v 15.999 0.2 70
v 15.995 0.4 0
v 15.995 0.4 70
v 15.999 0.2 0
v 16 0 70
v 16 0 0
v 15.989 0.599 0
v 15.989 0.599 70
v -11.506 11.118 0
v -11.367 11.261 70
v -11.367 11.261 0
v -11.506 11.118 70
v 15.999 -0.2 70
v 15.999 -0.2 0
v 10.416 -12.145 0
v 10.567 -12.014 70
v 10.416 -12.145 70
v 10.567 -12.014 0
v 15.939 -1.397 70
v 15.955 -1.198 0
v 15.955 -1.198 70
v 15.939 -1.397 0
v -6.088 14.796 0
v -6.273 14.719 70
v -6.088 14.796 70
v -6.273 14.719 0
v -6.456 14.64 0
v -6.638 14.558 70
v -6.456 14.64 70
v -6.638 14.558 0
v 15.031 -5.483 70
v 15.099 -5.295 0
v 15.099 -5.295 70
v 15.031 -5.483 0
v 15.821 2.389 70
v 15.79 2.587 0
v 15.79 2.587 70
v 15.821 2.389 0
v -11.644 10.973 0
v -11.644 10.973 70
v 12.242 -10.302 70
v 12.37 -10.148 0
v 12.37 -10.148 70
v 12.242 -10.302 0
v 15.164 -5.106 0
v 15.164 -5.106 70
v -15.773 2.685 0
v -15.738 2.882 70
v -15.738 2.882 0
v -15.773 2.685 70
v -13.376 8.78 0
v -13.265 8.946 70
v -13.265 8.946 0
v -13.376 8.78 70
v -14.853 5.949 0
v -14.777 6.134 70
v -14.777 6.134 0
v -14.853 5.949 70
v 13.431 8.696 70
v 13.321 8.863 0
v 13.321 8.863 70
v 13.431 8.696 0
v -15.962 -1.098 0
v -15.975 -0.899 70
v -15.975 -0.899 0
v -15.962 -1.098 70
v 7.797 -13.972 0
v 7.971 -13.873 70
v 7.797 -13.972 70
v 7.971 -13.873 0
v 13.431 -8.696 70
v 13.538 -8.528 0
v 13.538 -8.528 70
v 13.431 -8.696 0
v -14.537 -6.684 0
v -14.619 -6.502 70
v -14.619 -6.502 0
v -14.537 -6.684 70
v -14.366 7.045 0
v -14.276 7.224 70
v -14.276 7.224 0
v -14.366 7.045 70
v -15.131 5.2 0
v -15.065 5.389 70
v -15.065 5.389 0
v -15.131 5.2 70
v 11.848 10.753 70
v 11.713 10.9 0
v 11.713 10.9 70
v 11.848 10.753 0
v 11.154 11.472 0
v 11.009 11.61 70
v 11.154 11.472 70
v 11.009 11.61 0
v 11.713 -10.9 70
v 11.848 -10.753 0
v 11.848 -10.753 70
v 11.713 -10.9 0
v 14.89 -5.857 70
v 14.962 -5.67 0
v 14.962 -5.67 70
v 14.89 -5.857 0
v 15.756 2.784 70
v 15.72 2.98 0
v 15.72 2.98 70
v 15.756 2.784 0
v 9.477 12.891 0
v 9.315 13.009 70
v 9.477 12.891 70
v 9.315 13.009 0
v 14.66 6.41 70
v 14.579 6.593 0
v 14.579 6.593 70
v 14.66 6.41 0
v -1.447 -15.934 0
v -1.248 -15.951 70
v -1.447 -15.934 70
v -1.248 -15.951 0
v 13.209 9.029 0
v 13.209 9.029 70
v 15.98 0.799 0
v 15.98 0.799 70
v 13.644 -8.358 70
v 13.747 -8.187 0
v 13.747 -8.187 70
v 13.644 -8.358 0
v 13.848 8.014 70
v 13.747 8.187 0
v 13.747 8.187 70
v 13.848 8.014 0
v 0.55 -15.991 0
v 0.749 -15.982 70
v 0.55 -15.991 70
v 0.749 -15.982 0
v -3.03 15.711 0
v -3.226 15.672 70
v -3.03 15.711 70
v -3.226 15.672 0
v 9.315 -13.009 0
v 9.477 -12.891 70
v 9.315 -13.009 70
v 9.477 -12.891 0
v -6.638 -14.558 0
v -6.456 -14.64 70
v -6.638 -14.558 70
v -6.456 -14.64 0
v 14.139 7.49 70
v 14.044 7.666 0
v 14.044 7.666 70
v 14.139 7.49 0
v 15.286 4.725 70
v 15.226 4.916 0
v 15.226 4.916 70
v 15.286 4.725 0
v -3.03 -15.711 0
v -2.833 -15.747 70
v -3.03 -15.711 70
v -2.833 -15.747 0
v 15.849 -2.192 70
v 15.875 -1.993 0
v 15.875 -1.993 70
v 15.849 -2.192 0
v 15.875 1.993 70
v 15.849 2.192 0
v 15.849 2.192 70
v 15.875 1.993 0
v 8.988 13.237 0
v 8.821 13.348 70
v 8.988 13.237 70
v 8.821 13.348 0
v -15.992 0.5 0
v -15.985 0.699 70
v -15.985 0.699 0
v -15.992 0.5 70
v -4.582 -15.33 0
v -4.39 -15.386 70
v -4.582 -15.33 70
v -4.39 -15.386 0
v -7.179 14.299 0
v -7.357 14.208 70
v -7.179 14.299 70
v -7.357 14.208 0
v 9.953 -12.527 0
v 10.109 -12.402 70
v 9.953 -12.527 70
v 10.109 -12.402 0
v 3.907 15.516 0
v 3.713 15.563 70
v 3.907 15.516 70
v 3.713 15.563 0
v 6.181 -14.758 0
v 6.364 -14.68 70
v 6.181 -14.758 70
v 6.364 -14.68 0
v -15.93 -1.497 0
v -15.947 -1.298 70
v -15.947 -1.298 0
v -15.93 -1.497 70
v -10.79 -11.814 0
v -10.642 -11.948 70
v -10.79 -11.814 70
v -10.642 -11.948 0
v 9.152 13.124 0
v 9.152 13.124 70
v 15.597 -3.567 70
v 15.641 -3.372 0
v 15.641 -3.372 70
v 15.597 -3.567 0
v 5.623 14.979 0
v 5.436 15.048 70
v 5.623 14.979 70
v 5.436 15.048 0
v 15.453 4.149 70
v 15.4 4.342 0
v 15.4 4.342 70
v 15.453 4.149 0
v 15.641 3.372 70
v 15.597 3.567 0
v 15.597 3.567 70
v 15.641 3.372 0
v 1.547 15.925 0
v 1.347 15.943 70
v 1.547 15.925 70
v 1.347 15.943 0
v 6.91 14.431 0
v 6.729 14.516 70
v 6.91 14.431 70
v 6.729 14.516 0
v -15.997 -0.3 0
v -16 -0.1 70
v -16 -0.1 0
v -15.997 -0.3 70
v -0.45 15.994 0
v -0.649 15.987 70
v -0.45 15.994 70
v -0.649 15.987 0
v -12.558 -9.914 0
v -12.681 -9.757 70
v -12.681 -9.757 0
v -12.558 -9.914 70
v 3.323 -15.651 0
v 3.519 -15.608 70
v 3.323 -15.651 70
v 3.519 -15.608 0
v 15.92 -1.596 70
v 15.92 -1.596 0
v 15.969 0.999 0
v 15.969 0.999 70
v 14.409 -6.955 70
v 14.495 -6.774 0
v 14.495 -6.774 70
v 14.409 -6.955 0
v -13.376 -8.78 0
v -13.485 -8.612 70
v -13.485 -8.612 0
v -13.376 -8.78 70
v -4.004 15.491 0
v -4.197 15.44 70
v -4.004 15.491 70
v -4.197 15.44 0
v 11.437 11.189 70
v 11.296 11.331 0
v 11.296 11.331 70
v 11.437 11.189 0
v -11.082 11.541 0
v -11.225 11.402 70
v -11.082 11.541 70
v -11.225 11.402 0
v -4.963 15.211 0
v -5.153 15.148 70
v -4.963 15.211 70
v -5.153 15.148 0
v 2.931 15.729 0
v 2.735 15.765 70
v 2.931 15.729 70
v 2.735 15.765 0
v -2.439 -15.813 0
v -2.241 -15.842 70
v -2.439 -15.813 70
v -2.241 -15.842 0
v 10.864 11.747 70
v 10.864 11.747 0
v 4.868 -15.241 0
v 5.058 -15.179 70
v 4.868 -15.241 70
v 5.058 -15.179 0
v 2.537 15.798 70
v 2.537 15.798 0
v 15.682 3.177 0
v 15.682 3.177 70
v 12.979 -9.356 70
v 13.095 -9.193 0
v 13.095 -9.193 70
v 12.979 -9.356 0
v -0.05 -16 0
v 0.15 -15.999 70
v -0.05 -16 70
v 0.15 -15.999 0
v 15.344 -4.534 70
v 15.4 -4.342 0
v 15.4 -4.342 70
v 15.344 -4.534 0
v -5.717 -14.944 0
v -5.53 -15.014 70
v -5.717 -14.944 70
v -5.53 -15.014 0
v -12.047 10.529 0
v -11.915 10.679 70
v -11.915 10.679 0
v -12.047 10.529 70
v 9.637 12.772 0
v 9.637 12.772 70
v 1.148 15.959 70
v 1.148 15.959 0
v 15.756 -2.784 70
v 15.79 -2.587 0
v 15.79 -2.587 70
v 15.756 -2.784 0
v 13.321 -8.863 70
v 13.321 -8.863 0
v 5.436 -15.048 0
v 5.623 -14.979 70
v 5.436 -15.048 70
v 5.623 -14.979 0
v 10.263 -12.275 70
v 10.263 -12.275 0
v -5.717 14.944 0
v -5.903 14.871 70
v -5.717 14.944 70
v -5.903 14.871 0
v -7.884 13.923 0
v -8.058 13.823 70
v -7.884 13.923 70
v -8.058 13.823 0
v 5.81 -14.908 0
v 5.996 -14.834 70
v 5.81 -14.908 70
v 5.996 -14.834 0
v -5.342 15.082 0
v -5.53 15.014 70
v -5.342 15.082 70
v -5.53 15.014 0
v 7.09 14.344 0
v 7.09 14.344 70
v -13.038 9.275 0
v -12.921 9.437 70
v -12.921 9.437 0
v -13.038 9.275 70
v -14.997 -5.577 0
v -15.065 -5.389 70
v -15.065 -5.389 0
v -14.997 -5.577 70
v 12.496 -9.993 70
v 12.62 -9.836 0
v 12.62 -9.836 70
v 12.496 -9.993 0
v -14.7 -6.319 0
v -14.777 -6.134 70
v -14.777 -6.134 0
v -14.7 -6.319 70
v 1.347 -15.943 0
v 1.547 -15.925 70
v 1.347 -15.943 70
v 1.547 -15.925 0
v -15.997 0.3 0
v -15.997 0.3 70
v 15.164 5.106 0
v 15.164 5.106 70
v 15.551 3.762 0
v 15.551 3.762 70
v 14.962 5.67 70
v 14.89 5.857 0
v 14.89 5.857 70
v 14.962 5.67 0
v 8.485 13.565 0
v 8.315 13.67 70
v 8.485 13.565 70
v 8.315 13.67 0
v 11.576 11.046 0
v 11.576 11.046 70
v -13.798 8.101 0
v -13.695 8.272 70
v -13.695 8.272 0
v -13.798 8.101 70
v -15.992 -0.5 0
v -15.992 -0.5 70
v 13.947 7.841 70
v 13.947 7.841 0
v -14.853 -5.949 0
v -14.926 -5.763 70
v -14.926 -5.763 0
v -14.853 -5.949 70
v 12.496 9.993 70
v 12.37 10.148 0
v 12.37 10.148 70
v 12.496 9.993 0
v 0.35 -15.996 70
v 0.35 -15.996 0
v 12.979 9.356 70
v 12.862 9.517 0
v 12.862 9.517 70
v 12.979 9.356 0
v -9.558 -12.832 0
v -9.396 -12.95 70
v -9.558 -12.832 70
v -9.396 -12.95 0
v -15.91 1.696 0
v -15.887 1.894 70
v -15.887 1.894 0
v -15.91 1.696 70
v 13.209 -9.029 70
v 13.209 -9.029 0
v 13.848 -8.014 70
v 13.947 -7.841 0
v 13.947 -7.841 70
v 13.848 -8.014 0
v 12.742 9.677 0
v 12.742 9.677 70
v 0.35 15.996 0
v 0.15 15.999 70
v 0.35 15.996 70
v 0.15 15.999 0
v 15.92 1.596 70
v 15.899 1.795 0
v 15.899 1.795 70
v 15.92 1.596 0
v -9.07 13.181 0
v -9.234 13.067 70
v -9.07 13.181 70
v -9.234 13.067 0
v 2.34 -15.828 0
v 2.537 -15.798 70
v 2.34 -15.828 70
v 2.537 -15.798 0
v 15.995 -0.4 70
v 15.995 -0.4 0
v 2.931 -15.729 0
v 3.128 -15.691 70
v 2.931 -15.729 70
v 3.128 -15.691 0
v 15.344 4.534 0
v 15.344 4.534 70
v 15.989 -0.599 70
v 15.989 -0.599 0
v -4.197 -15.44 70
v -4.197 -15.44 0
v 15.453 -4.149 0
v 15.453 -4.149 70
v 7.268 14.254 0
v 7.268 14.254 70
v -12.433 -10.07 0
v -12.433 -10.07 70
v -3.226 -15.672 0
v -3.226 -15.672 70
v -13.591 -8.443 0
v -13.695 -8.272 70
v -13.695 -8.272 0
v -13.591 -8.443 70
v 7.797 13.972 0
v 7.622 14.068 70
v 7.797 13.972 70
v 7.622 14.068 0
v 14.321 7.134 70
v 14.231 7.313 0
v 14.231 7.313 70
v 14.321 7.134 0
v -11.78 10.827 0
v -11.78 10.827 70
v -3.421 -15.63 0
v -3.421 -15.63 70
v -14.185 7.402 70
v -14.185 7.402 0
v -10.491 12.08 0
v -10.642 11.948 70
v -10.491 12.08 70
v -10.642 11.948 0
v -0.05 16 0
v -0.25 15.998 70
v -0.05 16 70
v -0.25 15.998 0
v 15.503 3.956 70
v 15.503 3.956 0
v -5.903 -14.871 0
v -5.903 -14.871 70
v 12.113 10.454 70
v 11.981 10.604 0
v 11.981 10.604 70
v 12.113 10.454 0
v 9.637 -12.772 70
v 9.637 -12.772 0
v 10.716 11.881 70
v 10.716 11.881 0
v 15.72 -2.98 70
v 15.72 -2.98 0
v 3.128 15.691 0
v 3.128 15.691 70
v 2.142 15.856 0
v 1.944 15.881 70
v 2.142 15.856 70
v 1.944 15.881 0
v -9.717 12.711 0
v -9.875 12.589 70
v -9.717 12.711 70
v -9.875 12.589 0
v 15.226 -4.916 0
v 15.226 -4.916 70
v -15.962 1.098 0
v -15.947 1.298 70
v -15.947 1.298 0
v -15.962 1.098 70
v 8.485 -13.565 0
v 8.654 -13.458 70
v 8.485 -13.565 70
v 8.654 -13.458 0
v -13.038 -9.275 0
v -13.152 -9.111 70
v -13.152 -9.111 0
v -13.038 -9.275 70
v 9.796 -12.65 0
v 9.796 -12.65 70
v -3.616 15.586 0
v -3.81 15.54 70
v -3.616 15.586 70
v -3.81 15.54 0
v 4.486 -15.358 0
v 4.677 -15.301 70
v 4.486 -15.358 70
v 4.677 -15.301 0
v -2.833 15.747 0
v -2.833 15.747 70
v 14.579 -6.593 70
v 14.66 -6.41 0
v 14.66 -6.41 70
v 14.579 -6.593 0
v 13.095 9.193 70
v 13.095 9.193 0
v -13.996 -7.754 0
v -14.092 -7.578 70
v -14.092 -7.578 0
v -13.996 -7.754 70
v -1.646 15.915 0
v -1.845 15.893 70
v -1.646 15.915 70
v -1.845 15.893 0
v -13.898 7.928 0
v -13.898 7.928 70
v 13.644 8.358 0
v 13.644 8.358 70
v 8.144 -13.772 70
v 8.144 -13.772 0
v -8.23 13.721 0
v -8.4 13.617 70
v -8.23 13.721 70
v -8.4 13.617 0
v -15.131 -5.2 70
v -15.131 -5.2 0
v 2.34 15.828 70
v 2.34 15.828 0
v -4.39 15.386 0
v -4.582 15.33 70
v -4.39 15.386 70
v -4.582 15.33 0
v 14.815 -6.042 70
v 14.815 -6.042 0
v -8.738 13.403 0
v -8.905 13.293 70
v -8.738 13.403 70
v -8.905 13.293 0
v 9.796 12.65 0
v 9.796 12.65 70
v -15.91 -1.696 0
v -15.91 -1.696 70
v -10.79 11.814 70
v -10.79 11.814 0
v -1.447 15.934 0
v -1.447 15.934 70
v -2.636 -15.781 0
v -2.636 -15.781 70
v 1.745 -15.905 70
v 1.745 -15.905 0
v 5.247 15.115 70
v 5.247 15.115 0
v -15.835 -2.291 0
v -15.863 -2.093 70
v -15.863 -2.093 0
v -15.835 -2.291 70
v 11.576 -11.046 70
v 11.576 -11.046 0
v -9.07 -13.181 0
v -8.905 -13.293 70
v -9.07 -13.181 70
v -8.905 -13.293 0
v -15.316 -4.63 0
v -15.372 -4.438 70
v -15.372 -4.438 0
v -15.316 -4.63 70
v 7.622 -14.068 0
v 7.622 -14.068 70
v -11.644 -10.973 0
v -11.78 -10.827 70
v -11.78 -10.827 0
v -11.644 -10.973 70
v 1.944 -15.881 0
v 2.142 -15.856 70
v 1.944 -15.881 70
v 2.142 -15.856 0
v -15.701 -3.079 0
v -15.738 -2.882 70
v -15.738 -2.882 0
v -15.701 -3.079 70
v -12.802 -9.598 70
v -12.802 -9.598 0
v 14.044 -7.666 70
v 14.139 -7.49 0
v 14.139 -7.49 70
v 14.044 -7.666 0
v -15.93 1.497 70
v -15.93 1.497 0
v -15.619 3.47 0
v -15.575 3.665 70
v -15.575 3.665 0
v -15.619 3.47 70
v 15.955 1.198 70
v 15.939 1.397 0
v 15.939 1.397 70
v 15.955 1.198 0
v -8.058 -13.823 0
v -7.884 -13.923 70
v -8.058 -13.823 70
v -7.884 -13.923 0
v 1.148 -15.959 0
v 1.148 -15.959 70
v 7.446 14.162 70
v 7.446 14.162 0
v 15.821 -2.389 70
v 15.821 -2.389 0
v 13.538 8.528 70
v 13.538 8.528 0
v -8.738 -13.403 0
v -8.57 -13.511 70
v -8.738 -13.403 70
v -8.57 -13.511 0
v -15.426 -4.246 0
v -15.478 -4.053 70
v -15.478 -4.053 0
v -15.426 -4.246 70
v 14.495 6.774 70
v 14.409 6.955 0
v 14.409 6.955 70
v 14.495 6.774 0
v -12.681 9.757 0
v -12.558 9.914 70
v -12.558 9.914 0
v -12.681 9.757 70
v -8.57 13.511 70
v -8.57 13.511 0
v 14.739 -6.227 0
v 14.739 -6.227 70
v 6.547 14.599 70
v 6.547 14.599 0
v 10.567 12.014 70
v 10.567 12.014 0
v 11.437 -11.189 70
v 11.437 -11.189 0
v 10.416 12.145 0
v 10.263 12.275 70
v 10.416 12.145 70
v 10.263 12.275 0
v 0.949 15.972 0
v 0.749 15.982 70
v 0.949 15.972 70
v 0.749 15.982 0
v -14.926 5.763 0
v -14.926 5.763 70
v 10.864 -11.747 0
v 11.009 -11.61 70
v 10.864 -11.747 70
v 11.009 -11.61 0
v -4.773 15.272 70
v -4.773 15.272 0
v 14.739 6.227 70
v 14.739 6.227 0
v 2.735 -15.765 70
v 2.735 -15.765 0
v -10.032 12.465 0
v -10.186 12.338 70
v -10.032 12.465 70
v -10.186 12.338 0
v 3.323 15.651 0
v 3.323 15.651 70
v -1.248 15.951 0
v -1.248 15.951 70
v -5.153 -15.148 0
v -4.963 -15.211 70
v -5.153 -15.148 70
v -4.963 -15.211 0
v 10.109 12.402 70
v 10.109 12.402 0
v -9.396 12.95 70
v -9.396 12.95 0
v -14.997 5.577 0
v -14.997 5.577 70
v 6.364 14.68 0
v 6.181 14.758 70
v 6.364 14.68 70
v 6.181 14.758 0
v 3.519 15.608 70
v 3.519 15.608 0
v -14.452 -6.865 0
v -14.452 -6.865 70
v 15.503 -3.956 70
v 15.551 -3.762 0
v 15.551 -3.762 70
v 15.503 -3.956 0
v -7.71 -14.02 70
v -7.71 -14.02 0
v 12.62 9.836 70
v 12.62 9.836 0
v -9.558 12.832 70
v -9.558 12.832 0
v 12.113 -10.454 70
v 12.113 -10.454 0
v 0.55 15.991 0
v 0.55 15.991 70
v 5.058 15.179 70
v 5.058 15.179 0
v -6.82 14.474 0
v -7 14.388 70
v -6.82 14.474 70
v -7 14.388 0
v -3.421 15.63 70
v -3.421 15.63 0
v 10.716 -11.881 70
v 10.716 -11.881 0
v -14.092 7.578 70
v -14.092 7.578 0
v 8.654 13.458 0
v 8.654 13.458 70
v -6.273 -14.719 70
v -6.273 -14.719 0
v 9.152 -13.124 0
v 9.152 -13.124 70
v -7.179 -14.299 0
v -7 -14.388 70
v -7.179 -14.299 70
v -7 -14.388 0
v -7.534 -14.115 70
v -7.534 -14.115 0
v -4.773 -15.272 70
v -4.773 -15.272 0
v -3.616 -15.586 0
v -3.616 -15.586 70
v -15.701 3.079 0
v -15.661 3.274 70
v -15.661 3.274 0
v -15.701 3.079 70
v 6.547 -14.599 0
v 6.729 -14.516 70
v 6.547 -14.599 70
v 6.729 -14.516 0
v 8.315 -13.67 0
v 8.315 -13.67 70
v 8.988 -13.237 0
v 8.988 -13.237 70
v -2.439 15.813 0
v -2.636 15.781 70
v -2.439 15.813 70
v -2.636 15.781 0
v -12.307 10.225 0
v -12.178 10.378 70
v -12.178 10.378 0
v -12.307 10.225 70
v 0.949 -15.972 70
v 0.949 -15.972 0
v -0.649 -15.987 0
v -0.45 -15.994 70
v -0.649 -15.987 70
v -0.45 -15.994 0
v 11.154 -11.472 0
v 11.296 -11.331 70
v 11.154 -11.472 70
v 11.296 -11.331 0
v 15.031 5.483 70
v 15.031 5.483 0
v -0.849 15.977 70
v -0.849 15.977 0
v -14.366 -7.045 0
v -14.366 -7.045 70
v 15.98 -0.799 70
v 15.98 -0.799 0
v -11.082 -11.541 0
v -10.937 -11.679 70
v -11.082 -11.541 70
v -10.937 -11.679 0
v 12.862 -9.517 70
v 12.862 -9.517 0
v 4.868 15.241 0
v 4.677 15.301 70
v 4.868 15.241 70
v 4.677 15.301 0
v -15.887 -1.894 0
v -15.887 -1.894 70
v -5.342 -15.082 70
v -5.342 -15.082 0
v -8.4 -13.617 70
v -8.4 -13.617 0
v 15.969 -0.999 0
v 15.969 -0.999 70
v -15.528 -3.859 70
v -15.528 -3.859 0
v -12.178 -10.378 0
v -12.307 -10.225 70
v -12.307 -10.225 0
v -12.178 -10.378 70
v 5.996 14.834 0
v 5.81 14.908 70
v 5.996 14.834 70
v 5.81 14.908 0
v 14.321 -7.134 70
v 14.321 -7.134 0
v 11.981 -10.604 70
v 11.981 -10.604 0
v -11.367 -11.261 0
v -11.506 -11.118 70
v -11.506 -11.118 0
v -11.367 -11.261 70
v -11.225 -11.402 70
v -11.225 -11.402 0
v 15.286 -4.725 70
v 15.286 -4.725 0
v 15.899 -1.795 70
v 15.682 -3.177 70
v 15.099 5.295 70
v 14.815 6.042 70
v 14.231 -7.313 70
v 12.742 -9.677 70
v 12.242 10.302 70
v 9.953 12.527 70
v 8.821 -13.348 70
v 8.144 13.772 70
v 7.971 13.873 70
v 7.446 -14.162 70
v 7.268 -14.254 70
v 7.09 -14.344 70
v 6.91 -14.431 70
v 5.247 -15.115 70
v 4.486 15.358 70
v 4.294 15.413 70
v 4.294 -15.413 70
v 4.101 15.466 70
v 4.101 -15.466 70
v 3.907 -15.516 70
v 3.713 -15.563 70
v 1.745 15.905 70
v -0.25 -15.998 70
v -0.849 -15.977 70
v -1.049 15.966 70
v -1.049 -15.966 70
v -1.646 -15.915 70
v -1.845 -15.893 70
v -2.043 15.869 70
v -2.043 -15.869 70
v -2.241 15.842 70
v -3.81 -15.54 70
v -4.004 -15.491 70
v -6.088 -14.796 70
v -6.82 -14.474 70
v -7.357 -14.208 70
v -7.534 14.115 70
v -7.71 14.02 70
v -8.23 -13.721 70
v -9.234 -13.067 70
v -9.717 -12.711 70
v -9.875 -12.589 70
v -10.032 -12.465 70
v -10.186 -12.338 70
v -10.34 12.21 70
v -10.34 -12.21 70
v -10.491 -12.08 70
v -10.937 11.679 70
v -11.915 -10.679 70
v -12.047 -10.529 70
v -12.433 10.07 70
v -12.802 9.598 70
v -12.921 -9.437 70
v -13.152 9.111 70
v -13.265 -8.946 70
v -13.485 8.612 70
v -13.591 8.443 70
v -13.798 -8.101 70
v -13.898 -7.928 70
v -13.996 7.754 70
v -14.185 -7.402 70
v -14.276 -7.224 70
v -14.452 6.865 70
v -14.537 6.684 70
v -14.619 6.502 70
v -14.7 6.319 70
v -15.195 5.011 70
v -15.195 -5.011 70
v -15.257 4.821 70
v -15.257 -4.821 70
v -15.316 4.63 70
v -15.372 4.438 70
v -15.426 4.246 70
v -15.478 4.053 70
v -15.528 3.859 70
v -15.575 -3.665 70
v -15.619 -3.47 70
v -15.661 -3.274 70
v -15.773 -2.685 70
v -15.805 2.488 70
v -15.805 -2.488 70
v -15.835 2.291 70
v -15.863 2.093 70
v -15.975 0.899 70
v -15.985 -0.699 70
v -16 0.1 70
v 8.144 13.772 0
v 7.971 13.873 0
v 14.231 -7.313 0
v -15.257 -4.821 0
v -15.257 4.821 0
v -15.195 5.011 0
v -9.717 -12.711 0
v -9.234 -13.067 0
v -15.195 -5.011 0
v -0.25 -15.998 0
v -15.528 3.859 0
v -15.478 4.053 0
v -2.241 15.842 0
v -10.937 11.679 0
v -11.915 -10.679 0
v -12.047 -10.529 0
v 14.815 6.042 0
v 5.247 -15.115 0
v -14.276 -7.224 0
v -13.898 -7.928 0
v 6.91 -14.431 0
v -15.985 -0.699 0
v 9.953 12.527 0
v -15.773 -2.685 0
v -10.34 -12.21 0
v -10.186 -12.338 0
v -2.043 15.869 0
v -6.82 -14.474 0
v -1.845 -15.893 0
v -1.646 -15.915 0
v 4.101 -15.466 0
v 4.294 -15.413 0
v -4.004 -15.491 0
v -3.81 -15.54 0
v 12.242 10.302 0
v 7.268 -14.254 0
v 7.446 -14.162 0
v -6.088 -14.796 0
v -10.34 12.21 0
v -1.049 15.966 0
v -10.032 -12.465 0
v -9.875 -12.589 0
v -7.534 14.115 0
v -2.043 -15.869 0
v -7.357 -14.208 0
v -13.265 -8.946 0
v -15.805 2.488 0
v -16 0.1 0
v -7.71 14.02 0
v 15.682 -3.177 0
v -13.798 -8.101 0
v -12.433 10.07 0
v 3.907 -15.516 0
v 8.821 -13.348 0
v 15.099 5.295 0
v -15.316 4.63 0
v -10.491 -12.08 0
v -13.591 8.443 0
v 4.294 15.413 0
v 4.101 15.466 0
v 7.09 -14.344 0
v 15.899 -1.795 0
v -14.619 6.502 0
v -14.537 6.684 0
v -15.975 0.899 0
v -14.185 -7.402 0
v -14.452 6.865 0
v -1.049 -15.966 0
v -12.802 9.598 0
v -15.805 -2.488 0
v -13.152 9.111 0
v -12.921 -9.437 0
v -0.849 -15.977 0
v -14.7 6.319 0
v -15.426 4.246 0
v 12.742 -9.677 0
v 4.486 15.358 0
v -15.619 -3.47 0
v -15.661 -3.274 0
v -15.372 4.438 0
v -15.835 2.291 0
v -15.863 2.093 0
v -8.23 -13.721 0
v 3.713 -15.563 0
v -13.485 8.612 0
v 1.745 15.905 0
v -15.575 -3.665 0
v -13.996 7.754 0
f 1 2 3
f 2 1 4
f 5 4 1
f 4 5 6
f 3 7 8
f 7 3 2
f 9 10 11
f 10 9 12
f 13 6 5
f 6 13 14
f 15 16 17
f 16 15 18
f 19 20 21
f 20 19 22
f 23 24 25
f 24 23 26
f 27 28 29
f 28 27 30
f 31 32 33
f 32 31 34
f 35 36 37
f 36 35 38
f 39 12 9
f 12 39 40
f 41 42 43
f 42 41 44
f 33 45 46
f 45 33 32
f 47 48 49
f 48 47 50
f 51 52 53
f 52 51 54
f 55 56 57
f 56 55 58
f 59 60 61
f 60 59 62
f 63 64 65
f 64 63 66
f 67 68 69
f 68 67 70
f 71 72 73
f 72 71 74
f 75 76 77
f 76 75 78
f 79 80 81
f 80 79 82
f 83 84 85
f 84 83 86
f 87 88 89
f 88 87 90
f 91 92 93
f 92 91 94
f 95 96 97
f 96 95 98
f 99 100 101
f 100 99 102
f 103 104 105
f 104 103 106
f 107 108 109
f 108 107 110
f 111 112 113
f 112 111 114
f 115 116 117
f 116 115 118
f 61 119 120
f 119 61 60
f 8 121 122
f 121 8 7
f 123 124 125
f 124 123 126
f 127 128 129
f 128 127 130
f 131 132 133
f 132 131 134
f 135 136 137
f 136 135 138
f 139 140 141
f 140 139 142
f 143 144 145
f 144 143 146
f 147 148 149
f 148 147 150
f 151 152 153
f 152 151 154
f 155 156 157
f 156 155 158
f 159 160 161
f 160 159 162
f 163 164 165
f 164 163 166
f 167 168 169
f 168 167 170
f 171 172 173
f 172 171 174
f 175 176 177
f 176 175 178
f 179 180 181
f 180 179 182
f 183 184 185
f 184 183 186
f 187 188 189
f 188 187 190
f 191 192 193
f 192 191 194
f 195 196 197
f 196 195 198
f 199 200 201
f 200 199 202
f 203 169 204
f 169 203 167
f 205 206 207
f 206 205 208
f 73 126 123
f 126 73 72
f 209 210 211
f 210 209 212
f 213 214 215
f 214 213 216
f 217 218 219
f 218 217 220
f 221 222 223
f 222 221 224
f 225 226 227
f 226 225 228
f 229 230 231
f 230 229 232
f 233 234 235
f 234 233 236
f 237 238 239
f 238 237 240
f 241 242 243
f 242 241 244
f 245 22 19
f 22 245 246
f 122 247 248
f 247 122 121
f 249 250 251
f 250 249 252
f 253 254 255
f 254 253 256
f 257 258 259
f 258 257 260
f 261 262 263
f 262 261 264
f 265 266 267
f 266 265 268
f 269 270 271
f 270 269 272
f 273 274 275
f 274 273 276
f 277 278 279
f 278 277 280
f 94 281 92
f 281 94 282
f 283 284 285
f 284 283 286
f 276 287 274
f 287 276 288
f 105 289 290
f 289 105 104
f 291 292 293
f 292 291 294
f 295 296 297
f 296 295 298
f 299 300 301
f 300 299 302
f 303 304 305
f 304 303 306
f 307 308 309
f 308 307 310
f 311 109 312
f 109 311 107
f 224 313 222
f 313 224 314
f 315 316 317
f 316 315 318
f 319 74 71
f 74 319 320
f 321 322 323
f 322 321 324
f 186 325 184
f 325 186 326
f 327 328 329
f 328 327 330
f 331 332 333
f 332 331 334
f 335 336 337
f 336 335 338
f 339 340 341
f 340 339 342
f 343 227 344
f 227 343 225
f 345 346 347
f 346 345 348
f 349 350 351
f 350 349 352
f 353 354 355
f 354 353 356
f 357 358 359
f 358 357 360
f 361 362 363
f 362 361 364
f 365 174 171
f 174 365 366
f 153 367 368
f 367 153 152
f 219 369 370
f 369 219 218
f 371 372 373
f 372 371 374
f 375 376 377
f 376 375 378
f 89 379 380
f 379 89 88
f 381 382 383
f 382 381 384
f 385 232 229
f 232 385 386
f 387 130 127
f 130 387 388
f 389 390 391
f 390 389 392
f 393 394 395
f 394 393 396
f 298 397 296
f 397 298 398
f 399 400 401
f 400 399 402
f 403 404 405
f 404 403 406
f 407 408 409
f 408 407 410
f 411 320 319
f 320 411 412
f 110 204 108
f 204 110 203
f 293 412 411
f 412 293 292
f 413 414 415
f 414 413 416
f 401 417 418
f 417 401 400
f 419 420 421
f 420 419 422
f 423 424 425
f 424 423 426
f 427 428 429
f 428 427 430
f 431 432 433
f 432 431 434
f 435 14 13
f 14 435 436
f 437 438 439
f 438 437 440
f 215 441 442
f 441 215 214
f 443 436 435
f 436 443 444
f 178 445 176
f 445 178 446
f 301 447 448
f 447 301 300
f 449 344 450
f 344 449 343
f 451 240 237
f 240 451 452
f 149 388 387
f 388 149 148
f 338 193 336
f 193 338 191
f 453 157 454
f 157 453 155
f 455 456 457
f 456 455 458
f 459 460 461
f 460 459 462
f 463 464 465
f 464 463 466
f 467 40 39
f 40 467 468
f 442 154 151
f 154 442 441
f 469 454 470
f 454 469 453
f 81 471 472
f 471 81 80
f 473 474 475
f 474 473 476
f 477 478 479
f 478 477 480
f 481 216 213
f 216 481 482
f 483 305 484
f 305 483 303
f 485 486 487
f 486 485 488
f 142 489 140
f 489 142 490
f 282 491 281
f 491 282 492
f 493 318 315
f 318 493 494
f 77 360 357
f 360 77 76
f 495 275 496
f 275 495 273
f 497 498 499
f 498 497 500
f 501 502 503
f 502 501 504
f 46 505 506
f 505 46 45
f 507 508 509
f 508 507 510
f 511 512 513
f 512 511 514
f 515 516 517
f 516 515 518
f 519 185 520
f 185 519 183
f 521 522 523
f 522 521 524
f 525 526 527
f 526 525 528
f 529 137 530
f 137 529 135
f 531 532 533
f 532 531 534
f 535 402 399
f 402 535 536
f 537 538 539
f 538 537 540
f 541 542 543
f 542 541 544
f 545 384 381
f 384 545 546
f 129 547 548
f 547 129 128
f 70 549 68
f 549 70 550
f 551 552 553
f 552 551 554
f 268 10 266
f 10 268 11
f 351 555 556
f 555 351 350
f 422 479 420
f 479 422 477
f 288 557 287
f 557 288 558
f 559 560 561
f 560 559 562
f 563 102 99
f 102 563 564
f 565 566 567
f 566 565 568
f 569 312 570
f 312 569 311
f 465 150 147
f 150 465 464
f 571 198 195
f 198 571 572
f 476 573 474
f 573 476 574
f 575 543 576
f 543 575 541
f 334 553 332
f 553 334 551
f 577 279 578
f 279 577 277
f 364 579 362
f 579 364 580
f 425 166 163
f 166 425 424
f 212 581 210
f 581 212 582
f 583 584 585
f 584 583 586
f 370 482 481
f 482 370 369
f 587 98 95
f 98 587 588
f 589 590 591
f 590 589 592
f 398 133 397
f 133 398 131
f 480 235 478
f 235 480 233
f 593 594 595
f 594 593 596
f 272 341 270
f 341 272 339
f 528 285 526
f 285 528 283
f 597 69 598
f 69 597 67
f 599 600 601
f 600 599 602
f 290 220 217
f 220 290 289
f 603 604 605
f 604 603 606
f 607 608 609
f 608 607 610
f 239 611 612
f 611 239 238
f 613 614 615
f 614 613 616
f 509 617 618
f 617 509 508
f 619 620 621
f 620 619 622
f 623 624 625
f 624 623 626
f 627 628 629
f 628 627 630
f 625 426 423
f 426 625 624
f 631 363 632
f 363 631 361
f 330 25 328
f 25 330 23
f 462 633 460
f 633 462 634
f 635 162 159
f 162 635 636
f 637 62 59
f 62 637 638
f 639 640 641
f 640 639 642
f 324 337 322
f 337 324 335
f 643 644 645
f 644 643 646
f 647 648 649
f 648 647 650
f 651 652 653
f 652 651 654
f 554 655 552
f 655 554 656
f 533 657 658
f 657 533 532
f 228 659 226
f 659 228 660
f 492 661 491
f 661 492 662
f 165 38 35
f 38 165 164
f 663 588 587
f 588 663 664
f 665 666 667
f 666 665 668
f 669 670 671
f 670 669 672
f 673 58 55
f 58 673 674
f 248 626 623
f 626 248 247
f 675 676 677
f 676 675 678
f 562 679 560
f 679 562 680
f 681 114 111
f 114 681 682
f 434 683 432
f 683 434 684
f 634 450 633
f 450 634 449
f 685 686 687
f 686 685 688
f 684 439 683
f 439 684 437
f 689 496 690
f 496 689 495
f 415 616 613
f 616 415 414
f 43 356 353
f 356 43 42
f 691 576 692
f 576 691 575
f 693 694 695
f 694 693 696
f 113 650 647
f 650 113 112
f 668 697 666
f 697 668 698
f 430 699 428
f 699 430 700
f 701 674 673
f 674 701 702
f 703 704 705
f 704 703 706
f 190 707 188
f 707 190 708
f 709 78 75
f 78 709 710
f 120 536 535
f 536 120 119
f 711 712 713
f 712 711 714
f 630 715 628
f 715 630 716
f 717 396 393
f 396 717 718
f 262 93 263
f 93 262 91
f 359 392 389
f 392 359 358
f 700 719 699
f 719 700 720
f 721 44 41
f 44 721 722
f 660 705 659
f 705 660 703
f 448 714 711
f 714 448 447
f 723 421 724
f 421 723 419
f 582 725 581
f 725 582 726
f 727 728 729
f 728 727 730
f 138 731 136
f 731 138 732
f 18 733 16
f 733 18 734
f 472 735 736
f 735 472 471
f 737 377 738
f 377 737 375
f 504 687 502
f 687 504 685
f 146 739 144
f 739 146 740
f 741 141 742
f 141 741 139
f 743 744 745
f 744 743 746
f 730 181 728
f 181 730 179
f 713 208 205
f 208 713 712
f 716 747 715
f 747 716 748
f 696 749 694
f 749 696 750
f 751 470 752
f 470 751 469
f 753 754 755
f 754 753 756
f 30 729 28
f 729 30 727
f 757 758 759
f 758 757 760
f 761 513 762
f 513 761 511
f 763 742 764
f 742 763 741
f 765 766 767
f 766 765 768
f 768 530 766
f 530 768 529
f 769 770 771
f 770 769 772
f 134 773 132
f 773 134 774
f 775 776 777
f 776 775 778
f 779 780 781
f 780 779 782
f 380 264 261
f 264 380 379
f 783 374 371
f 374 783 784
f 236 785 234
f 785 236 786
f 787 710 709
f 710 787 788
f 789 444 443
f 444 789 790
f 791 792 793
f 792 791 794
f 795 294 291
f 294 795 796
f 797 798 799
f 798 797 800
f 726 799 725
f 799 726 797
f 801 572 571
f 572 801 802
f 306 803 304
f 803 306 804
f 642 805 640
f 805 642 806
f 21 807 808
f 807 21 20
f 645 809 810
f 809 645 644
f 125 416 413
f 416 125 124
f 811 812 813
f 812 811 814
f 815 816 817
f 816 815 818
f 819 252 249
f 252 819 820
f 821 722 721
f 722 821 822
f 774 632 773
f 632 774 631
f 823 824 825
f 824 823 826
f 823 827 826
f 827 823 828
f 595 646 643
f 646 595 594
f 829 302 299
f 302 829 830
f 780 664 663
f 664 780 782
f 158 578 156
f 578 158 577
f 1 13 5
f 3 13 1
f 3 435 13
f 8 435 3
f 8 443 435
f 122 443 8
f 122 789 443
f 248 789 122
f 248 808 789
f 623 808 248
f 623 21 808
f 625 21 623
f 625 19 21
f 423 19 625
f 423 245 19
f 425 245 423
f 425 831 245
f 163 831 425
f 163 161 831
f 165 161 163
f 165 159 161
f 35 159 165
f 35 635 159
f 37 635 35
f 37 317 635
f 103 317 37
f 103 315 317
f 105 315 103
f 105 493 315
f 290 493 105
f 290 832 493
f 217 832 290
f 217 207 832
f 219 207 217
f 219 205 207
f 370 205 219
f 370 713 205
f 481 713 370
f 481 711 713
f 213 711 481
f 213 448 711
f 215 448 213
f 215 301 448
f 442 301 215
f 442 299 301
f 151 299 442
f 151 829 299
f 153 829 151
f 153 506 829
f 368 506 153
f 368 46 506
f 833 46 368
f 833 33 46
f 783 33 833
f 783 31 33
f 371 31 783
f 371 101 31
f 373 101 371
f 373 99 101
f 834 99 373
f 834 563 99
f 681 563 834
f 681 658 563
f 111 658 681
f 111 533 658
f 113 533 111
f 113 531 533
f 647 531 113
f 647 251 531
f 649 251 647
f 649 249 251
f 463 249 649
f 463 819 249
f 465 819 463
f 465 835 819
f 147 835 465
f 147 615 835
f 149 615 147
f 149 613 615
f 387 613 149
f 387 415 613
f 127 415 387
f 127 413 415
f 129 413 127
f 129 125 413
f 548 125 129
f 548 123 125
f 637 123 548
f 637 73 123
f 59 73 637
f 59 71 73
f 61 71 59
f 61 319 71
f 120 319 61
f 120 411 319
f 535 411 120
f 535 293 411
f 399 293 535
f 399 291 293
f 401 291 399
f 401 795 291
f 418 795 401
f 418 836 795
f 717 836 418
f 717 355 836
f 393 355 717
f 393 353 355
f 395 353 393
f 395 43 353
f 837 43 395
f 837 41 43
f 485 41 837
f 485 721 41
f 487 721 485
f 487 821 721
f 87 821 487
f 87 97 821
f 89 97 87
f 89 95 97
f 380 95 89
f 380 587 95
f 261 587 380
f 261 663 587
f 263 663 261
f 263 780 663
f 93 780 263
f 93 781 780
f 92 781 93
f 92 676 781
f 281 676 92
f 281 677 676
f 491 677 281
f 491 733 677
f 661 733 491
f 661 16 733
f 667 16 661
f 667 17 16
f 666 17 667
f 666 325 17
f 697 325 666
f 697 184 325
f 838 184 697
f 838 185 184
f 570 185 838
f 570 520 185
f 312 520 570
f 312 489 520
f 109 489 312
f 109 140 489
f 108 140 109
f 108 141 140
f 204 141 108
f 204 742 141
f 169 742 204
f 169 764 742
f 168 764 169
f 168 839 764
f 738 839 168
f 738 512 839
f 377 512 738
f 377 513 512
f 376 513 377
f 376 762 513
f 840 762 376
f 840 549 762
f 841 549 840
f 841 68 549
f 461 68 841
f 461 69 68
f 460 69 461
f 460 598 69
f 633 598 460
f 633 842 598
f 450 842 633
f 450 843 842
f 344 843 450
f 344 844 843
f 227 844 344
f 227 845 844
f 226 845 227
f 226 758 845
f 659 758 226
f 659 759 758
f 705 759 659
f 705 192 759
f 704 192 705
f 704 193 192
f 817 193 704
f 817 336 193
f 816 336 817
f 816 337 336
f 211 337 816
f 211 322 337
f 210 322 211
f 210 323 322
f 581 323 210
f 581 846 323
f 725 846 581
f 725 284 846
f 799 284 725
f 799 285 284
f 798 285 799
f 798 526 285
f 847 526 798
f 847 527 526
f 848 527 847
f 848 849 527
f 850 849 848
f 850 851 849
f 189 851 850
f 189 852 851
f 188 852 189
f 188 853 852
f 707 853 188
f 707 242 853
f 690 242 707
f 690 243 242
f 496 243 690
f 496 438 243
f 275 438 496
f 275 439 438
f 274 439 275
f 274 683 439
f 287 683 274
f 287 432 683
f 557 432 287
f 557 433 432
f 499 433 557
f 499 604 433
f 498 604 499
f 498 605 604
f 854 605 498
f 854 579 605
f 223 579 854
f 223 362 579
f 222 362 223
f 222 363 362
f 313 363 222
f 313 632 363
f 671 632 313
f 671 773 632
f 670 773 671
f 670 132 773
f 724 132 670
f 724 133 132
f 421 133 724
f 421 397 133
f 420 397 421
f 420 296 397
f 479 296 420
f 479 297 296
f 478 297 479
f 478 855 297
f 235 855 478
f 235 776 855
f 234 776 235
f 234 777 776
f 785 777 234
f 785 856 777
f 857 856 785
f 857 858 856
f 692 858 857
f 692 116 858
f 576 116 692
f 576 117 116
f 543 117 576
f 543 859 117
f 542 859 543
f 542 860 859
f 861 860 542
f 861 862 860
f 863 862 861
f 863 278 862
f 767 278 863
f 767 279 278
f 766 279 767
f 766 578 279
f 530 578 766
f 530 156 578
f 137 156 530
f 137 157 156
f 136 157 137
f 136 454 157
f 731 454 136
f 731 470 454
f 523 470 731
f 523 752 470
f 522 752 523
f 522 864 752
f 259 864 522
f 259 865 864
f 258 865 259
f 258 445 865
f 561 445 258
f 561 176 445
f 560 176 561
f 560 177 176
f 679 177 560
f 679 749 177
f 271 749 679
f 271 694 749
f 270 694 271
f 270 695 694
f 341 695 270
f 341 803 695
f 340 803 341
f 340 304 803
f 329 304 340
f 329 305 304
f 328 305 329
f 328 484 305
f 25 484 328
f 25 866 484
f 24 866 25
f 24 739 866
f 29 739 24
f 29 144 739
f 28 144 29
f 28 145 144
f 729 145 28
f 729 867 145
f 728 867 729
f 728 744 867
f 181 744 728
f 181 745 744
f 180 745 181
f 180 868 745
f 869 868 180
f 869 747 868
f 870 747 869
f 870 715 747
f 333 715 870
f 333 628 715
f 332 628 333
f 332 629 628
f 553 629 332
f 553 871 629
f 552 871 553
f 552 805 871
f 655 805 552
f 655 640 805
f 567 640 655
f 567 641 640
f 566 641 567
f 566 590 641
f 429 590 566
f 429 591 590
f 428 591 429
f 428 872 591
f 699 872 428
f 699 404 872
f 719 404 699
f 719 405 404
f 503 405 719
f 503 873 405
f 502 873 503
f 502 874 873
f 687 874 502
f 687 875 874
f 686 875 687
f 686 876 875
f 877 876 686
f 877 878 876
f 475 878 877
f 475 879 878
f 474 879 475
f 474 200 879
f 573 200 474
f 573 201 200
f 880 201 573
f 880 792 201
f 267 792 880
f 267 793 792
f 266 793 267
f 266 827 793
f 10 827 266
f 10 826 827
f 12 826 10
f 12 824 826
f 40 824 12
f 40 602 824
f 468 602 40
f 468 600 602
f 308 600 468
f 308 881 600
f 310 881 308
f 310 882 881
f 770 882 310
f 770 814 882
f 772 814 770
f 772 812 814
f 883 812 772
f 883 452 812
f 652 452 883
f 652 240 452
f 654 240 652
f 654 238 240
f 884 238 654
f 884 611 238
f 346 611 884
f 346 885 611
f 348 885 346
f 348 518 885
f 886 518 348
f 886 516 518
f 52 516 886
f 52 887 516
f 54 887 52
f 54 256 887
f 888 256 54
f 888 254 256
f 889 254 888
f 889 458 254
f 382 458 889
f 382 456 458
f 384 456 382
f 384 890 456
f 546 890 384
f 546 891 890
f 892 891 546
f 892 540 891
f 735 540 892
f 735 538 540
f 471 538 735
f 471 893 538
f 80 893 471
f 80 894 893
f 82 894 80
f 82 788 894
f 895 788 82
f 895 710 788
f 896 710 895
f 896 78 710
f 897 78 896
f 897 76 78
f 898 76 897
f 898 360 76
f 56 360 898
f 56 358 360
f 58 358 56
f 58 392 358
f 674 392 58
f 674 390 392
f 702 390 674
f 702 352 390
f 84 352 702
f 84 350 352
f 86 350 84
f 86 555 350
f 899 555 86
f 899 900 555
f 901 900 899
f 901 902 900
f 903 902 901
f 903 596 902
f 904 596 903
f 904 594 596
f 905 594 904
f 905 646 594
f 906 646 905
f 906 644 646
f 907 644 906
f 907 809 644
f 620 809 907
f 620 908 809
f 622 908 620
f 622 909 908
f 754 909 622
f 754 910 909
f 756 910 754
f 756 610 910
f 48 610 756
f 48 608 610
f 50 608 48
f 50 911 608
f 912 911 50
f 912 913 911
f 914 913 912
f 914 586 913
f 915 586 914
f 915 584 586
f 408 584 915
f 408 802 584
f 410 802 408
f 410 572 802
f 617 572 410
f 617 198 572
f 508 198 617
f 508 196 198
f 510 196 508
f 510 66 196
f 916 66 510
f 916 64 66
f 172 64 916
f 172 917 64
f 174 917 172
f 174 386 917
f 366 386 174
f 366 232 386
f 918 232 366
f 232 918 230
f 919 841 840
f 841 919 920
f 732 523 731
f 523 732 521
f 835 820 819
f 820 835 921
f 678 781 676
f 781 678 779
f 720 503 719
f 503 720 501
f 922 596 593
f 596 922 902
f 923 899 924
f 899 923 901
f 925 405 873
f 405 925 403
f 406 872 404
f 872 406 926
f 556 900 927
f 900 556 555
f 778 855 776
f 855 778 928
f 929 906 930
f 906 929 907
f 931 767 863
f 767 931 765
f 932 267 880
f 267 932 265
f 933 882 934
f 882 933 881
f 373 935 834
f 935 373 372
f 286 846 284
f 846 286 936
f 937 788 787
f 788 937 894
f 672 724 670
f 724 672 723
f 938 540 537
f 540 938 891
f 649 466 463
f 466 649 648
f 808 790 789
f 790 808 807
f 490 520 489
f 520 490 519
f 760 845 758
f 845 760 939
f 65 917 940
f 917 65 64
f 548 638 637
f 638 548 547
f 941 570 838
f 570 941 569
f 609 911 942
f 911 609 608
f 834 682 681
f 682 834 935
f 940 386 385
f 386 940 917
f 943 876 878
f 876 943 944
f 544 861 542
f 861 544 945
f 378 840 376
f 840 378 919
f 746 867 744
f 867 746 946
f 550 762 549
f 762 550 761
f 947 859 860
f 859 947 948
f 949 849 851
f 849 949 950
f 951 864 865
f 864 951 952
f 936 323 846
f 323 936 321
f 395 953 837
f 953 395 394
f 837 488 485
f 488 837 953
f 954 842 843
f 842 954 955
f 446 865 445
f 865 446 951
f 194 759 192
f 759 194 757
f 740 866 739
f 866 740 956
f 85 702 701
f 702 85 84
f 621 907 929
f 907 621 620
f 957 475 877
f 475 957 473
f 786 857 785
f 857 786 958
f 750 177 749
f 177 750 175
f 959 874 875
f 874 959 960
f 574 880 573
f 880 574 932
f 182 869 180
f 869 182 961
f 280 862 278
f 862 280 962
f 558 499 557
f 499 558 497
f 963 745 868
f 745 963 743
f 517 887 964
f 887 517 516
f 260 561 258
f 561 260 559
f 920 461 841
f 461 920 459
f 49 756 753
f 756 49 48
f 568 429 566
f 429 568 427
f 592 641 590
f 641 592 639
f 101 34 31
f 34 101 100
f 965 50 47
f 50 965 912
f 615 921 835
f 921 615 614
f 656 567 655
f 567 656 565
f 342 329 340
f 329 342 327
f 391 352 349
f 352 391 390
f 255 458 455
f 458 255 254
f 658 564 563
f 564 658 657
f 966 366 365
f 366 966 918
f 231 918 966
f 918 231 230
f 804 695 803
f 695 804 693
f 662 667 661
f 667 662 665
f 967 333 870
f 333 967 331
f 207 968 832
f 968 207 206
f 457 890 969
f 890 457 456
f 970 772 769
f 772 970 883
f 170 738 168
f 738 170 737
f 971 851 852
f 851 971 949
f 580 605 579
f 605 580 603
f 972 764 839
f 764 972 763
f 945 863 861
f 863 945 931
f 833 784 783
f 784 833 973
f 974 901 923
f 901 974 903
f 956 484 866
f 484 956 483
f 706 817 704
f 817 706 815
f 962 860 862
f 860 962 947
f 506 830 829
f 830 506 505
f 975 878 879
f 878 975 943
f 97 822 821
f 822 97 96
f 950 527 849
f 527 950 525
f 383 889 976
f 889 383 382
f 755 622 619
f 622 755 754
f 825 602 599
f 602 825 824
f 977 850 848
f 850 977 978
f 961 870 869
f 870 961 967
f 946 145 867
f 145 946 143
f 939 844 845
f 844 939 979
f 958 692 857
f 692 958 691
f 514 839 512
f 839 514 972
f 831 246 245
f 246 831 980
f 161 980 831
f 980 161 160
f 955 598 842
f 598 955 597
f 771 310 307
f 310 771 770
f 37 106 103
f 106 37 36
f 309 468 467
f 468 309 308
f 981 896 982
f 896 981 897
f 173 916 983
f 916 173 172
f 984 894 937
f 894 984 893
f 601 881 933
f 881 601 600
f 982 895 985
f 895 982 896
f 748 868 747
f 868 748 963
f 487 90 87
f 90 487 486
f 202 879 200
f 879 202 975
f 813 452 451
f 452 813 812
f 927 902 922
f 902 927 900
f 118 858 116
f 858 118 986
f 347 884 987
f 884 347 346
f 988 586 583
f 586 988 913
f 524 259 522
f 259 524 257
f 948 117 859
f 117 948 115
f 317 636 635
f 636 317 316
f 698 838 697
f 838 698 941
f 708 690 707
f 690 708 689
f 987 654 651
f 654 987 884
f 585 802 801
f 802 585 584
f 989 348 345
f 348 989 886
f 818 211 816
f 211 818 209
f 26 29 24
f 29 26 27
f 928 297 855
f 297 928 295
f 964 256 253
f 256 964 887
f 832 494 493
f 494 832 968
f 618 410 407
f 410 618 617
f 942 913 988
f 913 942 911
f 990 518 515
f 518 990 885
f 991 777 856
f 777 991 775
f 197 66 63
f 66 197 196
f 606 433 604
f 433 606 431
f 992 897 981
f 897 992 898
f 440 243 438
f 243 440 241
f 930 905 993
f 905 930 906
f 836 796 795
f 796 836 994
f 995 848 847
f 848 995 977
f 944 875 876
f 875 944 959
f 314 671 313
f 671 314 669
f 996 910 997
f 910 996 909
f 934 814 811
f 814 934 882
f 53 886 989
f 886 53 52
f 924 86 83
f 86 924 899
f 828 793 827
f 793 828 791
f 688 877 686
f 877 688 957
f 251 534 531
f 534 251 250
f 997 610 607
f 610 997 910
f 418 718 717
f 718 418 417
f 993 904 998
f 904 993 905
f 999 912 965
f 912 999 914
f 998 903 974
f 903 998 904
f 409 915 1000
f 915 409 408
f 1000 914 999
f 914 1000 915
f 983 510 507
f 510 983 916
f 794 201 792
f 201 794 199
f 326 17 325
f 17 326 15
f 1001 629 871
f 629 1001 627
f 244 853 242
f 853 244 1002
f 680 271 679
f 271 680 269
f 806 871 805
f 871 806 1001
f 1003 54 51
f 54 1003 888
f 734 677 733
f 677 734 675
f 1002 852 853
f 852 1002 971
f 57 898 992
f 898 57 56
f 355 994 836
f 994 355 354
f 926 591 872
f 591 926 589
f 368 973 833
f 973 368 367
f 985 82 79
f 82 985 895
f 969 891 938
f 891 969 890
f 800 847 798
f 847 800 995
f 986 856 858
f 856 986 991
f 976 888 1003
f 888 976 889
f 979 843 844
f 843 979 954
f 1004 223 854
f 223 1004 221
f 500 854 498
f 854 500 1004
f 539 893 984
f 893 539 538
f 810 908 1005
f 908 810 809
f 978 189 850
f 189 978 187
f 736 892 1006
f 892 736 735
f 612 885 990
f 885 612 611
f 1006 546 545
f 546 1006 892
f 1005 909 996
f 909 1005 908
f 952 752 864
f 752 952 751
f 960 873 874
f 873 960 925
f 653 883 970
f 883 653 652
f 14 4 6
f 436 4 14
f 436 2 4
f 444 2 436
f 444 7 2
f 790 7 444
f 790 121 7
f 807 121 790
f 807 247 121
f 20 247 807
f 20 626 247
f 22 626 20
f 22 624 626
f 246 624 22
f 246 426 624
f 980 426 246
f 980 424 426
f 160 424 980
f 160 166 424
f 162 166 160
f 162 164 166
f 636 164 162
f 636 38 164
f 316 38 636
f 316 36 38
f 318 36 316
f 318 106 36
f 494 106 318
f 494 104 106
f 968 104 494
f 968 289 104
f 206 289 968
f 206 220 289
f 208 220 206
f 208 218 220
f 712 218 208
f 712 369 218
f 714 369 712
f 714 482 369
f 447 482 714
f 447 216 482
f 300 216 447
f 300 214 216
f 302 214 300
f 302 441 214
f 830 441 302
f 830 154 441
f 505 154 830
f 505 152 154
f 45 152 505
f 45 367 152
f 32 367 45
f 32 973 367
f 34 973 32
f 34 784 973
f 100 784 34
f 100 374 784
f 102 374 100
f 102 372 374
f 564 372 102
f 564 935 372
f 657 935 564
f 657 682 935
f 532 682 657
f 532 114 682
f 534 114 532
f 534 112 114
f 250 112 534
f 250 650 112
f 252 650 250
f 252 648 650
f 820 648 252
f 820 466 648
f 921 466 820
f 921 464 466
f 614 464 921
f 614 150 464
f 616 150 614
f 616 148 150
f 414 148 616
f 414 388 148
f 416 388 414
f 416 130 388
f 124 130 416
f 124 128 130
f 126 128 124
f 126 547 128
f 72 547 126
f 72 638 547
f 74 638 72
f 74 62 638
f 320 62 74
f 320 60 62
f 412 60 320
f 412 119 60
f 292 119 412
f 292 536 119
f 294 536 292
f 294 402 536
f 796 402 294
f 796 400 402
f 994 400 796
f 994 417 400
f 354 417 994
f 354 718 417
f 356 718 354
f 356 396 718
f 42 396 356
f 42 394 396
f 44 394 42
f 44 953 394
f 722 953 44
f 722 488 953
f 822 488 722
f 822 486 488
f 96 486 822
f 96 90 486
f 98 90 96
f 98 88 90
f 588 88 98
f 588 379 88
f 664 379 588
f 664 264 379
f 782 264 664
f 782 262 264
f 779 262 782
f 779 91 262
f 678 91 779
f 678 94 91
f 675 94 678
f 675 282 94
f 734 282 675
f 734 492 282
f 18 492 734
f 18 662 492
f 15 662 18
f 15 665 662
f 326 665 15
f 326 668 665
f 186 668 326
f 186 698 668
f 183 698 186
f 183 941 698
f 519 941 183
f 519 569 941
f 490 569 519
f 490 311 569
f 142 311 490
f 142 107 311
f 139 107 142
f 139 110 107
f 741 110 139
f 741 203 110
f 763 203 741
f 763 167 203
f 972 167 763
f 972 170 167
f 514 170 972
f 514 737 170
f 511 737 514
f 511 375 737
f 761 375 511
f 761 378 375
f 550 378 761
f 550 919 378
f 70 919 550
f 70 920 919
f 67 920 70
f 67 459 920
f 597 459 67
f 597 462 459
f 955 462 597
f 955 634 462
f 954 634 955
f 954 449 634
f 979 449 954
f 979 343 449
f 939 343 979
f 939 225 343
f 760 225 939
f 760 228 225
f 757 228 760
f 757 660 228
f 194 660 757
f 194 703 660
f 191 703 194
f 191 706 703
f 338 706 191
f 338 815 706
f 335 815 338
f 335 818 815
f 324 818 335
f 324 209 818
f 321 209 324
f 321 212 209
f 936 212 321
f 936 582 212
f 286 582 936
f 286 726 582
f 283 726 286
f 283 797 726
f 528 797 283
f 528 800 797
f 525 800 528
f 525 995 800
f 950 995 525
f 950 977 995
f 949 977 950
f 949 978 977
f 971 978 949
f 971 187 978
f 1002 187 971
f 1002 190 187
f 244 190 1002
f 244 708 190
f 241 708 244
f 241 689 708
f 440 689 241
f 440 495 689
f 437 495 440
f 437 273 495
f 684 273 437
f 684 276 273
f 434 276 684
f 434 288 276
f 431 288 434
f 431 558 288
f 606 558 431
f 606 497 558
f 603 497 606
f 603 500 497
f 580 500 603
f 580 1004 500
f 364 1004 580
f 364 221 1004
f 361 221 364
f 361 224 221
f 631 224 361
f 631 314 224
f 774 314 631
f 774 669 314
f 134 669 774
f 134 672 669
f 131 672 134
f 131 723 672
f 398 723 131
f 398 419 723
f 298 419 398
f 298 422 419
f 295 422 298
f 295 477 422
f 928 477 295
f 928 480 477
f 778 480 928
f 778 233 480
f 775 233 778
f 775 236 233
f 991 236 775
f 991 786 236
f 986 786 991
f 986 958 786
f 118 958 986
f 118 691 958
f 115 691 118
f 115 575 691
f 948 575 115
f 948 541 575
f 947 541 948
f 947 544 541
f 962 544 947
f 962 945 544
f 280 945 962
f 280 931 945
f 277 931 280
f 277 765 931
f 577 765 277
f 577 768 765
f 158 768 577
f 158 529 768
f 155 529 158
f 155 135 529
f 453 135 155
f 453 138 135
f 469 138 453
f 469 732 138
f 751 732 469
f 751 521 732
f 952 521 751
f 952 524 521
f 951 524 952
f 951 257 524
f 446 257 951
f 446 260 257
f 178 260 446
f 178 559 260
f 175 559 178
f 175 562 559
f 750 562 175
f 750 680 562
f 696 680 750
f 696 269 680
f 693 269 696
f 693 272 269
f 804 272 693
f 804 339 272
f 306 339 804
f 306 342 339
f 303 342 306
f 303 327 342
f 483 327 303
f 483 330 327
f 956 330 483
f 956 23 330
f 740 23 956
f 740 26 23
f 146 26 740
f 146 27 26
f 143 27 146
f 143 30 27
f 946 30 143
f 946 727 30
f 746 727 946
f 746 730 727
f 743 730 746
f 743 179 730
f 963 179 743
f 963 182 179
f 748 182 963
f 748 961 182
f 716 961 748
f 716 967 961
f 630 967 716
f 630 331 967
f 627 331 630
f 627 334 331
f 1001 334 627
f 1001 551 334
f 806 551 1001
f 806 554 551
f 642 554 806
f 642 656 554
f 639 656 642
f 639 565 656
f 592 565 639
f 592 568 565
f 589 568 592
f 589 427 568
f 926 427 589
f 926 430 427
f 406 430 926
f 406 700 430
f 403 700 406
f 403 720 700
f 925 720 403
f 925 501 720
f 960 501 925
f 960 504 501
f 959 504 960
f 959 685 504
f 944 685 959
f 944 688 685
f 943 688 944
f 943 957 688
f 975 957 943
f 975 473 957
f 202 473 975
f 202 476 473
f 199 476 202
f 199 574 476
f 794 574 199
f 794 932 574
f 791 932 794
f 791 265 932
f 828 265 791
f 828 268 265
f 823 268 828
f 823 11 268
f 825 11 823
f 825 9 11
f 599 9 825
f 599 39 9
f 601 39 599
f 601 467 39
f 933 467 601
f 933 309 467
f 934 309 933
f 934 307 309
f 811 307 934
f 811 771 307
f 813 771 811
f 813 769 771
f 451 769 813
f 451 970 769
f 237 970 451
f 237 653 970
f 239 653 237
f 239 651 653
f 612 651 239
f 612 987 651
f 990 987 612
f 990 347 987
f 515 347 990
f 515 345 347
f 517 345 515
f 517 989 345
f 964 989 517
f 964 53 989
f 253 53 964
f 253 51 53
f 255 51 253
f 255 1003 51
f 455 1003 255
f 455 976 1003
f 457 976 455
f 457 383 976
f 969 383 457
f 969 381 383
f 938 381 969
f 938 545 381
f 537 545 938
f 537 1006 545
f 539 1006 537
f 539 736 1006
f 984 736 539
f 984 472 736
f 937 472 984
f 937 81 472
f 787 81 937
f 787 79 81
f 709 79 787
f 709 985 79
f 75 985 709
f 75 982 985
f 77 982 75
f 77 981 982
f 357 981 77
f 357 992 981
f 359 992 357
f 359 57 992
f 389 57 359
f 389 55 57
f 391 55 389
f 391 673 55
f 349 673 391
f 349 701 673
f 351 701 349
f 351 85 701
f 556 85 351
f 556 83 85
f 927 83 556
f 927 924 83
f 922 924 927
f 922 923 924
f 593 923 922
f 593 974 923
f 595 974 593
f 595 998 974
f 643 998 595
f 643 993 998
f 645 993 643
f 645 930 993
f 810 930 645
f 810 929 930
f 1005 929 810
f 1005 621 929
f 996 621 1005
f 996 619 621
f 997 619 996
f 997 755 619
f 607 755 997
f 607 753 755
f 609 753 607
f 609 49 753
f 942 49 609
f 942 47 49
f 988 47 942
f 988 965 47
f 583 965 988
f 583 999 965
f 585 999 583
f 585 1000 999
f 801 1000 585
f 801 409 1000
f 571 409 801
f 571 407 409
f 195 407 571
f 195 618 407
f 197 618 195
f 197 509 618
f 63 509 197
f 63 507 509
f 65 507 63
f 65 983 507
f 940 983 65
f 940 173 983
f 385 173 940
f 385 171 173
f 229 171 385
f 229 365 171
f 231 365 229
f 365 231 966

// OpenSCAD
use <bendlib.scad>;

function battery(dim = undef, plus_dim = undef, minus_dim = undef) = [bl_def(dim, [18,65]), plus_dim, minus_dim];
function battery_18650(flat=false) = battery([18,65], flat ? undef : [5.5, 1.5]);
function battery_32700() = battery([32,70], undef, undef);

function battery_dim(type) = type[0];
function battery_plus_dim(type) = type[1];
function battery_minus_dim(type) = type[2];
function battery_flat(type) = type[1] == undef && type[2] == undef;

module battery(type = battery_18650()) {
    dim = battery_dim(type);
    
    d = dim[0];
    l = dim[1];
    
    plus_dim = battery_plus_dim(type);
    if (plus_dim != undef) {
        translate([0,0,l - 1])
        color("red")
        cylinder(d = plus_dim[0], h = plus_dim[1] + 1);
    }
    
    minus_dim = battery_minus_dim(type);
    if (minus_dim != undef) {
        translate([0,0,-minus_dim[1]])
        color("black")
        cylinder(d = minus_dim[0], h = minus_dim[1] + 1);
    }
    
    translate([0,0,l*0.9])
    color("red")
    cylinder(d = d, h = l*0.1);
    
    translate([0,0,l*0.1])
    cylinder(d = d, h = l*0.8);
    
    color("black")
    cylinder(d = d, h = l*0.1);
}

function battery_contact(
    dim = undef, 
    length = undef, 
    dia = undef
) = let(
    dim = bl_def(dim, [9.5, 9, 0.2]),
    length = bl_def(length, 1.5),
    dia = bl_def(dia, 6)
) [ dim, length, dia ];

function battery_contact_plus() = battery_contact();
function battery_contact_minus() = battery_contact(length = 9);
function battery_contact_dim(type) = type[0];
function battery_contact_length(type) = type[1];
function battery_contact_dia(type) = type[2];

module battery_contact(type = battery_contact_plus()) {
    dim = battery_contact_dim(type);
    length = battery_contact_length(type); 
    dia = battery_contact_dia(type);
    
    rotate([90,0,90])
    union() {
        translate([-dim[0]/2,-dim[1]/2,0])
        linear_extrude(dim[2]) {
            bl_square(dim, [3,3,1,1]);
            translate([(dim[0]-2.4)/2,0])
            bl_square([2.4,15],[1.2,1.2,0,0]);
        }
        cylinder(d = dia, h = length);
    }
}

function battery_contact_diff(
    contact = undef, 
    height = undef, 
    tolerance = undef, 
    wall = undef
) = let (
    contact = bl_def(contact, battery_contact_plus()),
    height = bl_def(height, battery_contact_dim(contact)[1]/2),
    tolerance = bl_def(tolerance, 0.2),
    wall = bl_def(wall, 0.8),
    contact_dim = battery_contact_dim(contact),
    dim = bl_mul(contact_dim, [1,0.5,1]) + [0,height,0] + bl_3d(tolerance)*2
) [ contact, height, tolerance, wall, dim ];

function battery_contact_diff_contact(type) = type[0];
function battery_contact_diff_height(type) = type[1];
function battery_contact_diff_tolerance(type) = type[2];
function battery_contact_diff_wall(type) = type[3];
function battery_contact_diff_dim(type) = type[4];

module battery_contact_diff(type = battery_contact_diff()) {
    contact = battery_contact_diff_contact(type);
    dim = battery_contact_diff_dim(type);
    dia = battery_contact_dia(contact);
    height = battery_contact_diff_height(type);
    tolerance = battery_contact_diff_tolerance(type);
    wall = battery_contact_diff_wall(type);
    
    rotate([90,0,90])
    union() {
        translate([-dim[0]/2,-dim[1]+height+tolerance,0])
        cube(dim);
        
        d = dia + tolerance*2;
        h = dim[2] + wall + tolerance;
        
        cylinder(d = d, h = h);
        translate([-d/2,0,0])
        cube([d, height + tolerance, h]);
    }
}

function battery_box(
    battery = undef,
    thickness = undef,
    battery_tolerance = undef,
    minus_contact = undef,
    plus_contact = undef,
    height = undef,
    tolerance = undef,
    wall = undef
) = let(
    battery = bl_def(battery, battery()),
    thickness = bl_3d(bl_def(thickness, 1.5)),
    battery_tolerance = bl_3d(bl_def(battery_tolerance, 0.5)),
    wall = bl_def(wall, 0.8),
    minus_contact = bl_def(minus_contact, battery_contact_minus()),
    plus_contact = bl_def(plus_contact, battery_contact_plus()),
    diff = battery_contact_diff(plus_contact, height, tolerance, wall),
    dim = bl_mul(thickness,[2,2]) + bl_mul(battery_tolerance, [2,2]) + [
        battery_contact_length(minus_contact) / 2 + battery_dim(battery)[1] + battery_contact_length(plus_contact),
        battery_dim(battery)[0],
        battery_dim(battery)[0]/2 + battery_contact_diff_height(diff)
    ],
    inner_dim = dim - bl_mul(thickness,[2,2]) - [
        (battery_contact_diff_dim(diff)[2]+battery_contact_diff_wall(diff))*2,
        0,
        -battery_tolerance[2]
    ]
) [
    battery,
    thickness,
    battery_tolerance,
    inner_dim,
    dim,
    minus_contact,
    plus_contact,
    diff
];

function battery_box_battery(type) = type[0];
function battery_box_thickness(type) = type[1];
function battery_box_battery_tolerance(type) = type[2];
function battery_box_inner_dim(type) = type[3];
function battery_box_dim(type) = type[4];
function battery_box_minus_contact(type) = type[5];
function battery_box_plus_contact(type) = type[6];
function battery_box_diff(type) = type[7];

module battery_box(type, with_battery = false, with_contacts = false) {
    battery = battery_box_battery(type);
    battery_dim = battery_dim(battery_box_battery(type));
    thickness = battery_box_thickness(type);
    battery_tolerance = battery_box_battery_tolerance(type);
    dim = battery_box_dim(type);
    inner_dim = battery_box_inner_dim(type);
    diff = battery_box_diff(type);

    off = [
        (dim[0] - inner_dim[0])/2, 
        dim[1]/2, 
        dim[2] - battery_contact_diff_height(diff)
    ];

    difference() {

        cube(dim);
        translate([off[0], thickness[1], thickness[2]])
        cube(inner_dim);
        
        translate([0, off[1], off[2]]) {
            translate([thickness[0], 0, 0])
            battery_contact_diff(diff);
            
            translate([dim[0]-thickness[0], 0,0])
            mirror([1,0,0])
            battery_contact_diff(diff);
        }
    }
    
    if (with_battery) {
        translate([dim[0] - battery_dim[1] - off[0] - battery_tolerance[0], off[1], off[2]])
        rotate([0,90,0])
        battery(battery);
    }
    
    if (with_contacts) {
        translate([0, off[1], off[2]]) {
            translate([thickness[0], 0, 0])
            battery_contact(battery_box_minus_contact(type));
            
            translate([dim[0] - thickness[0], 0, 0])
            mirror([1,0,0])
            battery_contact(battery_box_plus_contact(type));
        }
    }
}

$fa = 0.2;
$fs = 0.2;

*battery();
*battery_contact();
*battery_box(battery_box(), with_contacts = true);

*battery_contact_diff();


battery(battery_32700());
